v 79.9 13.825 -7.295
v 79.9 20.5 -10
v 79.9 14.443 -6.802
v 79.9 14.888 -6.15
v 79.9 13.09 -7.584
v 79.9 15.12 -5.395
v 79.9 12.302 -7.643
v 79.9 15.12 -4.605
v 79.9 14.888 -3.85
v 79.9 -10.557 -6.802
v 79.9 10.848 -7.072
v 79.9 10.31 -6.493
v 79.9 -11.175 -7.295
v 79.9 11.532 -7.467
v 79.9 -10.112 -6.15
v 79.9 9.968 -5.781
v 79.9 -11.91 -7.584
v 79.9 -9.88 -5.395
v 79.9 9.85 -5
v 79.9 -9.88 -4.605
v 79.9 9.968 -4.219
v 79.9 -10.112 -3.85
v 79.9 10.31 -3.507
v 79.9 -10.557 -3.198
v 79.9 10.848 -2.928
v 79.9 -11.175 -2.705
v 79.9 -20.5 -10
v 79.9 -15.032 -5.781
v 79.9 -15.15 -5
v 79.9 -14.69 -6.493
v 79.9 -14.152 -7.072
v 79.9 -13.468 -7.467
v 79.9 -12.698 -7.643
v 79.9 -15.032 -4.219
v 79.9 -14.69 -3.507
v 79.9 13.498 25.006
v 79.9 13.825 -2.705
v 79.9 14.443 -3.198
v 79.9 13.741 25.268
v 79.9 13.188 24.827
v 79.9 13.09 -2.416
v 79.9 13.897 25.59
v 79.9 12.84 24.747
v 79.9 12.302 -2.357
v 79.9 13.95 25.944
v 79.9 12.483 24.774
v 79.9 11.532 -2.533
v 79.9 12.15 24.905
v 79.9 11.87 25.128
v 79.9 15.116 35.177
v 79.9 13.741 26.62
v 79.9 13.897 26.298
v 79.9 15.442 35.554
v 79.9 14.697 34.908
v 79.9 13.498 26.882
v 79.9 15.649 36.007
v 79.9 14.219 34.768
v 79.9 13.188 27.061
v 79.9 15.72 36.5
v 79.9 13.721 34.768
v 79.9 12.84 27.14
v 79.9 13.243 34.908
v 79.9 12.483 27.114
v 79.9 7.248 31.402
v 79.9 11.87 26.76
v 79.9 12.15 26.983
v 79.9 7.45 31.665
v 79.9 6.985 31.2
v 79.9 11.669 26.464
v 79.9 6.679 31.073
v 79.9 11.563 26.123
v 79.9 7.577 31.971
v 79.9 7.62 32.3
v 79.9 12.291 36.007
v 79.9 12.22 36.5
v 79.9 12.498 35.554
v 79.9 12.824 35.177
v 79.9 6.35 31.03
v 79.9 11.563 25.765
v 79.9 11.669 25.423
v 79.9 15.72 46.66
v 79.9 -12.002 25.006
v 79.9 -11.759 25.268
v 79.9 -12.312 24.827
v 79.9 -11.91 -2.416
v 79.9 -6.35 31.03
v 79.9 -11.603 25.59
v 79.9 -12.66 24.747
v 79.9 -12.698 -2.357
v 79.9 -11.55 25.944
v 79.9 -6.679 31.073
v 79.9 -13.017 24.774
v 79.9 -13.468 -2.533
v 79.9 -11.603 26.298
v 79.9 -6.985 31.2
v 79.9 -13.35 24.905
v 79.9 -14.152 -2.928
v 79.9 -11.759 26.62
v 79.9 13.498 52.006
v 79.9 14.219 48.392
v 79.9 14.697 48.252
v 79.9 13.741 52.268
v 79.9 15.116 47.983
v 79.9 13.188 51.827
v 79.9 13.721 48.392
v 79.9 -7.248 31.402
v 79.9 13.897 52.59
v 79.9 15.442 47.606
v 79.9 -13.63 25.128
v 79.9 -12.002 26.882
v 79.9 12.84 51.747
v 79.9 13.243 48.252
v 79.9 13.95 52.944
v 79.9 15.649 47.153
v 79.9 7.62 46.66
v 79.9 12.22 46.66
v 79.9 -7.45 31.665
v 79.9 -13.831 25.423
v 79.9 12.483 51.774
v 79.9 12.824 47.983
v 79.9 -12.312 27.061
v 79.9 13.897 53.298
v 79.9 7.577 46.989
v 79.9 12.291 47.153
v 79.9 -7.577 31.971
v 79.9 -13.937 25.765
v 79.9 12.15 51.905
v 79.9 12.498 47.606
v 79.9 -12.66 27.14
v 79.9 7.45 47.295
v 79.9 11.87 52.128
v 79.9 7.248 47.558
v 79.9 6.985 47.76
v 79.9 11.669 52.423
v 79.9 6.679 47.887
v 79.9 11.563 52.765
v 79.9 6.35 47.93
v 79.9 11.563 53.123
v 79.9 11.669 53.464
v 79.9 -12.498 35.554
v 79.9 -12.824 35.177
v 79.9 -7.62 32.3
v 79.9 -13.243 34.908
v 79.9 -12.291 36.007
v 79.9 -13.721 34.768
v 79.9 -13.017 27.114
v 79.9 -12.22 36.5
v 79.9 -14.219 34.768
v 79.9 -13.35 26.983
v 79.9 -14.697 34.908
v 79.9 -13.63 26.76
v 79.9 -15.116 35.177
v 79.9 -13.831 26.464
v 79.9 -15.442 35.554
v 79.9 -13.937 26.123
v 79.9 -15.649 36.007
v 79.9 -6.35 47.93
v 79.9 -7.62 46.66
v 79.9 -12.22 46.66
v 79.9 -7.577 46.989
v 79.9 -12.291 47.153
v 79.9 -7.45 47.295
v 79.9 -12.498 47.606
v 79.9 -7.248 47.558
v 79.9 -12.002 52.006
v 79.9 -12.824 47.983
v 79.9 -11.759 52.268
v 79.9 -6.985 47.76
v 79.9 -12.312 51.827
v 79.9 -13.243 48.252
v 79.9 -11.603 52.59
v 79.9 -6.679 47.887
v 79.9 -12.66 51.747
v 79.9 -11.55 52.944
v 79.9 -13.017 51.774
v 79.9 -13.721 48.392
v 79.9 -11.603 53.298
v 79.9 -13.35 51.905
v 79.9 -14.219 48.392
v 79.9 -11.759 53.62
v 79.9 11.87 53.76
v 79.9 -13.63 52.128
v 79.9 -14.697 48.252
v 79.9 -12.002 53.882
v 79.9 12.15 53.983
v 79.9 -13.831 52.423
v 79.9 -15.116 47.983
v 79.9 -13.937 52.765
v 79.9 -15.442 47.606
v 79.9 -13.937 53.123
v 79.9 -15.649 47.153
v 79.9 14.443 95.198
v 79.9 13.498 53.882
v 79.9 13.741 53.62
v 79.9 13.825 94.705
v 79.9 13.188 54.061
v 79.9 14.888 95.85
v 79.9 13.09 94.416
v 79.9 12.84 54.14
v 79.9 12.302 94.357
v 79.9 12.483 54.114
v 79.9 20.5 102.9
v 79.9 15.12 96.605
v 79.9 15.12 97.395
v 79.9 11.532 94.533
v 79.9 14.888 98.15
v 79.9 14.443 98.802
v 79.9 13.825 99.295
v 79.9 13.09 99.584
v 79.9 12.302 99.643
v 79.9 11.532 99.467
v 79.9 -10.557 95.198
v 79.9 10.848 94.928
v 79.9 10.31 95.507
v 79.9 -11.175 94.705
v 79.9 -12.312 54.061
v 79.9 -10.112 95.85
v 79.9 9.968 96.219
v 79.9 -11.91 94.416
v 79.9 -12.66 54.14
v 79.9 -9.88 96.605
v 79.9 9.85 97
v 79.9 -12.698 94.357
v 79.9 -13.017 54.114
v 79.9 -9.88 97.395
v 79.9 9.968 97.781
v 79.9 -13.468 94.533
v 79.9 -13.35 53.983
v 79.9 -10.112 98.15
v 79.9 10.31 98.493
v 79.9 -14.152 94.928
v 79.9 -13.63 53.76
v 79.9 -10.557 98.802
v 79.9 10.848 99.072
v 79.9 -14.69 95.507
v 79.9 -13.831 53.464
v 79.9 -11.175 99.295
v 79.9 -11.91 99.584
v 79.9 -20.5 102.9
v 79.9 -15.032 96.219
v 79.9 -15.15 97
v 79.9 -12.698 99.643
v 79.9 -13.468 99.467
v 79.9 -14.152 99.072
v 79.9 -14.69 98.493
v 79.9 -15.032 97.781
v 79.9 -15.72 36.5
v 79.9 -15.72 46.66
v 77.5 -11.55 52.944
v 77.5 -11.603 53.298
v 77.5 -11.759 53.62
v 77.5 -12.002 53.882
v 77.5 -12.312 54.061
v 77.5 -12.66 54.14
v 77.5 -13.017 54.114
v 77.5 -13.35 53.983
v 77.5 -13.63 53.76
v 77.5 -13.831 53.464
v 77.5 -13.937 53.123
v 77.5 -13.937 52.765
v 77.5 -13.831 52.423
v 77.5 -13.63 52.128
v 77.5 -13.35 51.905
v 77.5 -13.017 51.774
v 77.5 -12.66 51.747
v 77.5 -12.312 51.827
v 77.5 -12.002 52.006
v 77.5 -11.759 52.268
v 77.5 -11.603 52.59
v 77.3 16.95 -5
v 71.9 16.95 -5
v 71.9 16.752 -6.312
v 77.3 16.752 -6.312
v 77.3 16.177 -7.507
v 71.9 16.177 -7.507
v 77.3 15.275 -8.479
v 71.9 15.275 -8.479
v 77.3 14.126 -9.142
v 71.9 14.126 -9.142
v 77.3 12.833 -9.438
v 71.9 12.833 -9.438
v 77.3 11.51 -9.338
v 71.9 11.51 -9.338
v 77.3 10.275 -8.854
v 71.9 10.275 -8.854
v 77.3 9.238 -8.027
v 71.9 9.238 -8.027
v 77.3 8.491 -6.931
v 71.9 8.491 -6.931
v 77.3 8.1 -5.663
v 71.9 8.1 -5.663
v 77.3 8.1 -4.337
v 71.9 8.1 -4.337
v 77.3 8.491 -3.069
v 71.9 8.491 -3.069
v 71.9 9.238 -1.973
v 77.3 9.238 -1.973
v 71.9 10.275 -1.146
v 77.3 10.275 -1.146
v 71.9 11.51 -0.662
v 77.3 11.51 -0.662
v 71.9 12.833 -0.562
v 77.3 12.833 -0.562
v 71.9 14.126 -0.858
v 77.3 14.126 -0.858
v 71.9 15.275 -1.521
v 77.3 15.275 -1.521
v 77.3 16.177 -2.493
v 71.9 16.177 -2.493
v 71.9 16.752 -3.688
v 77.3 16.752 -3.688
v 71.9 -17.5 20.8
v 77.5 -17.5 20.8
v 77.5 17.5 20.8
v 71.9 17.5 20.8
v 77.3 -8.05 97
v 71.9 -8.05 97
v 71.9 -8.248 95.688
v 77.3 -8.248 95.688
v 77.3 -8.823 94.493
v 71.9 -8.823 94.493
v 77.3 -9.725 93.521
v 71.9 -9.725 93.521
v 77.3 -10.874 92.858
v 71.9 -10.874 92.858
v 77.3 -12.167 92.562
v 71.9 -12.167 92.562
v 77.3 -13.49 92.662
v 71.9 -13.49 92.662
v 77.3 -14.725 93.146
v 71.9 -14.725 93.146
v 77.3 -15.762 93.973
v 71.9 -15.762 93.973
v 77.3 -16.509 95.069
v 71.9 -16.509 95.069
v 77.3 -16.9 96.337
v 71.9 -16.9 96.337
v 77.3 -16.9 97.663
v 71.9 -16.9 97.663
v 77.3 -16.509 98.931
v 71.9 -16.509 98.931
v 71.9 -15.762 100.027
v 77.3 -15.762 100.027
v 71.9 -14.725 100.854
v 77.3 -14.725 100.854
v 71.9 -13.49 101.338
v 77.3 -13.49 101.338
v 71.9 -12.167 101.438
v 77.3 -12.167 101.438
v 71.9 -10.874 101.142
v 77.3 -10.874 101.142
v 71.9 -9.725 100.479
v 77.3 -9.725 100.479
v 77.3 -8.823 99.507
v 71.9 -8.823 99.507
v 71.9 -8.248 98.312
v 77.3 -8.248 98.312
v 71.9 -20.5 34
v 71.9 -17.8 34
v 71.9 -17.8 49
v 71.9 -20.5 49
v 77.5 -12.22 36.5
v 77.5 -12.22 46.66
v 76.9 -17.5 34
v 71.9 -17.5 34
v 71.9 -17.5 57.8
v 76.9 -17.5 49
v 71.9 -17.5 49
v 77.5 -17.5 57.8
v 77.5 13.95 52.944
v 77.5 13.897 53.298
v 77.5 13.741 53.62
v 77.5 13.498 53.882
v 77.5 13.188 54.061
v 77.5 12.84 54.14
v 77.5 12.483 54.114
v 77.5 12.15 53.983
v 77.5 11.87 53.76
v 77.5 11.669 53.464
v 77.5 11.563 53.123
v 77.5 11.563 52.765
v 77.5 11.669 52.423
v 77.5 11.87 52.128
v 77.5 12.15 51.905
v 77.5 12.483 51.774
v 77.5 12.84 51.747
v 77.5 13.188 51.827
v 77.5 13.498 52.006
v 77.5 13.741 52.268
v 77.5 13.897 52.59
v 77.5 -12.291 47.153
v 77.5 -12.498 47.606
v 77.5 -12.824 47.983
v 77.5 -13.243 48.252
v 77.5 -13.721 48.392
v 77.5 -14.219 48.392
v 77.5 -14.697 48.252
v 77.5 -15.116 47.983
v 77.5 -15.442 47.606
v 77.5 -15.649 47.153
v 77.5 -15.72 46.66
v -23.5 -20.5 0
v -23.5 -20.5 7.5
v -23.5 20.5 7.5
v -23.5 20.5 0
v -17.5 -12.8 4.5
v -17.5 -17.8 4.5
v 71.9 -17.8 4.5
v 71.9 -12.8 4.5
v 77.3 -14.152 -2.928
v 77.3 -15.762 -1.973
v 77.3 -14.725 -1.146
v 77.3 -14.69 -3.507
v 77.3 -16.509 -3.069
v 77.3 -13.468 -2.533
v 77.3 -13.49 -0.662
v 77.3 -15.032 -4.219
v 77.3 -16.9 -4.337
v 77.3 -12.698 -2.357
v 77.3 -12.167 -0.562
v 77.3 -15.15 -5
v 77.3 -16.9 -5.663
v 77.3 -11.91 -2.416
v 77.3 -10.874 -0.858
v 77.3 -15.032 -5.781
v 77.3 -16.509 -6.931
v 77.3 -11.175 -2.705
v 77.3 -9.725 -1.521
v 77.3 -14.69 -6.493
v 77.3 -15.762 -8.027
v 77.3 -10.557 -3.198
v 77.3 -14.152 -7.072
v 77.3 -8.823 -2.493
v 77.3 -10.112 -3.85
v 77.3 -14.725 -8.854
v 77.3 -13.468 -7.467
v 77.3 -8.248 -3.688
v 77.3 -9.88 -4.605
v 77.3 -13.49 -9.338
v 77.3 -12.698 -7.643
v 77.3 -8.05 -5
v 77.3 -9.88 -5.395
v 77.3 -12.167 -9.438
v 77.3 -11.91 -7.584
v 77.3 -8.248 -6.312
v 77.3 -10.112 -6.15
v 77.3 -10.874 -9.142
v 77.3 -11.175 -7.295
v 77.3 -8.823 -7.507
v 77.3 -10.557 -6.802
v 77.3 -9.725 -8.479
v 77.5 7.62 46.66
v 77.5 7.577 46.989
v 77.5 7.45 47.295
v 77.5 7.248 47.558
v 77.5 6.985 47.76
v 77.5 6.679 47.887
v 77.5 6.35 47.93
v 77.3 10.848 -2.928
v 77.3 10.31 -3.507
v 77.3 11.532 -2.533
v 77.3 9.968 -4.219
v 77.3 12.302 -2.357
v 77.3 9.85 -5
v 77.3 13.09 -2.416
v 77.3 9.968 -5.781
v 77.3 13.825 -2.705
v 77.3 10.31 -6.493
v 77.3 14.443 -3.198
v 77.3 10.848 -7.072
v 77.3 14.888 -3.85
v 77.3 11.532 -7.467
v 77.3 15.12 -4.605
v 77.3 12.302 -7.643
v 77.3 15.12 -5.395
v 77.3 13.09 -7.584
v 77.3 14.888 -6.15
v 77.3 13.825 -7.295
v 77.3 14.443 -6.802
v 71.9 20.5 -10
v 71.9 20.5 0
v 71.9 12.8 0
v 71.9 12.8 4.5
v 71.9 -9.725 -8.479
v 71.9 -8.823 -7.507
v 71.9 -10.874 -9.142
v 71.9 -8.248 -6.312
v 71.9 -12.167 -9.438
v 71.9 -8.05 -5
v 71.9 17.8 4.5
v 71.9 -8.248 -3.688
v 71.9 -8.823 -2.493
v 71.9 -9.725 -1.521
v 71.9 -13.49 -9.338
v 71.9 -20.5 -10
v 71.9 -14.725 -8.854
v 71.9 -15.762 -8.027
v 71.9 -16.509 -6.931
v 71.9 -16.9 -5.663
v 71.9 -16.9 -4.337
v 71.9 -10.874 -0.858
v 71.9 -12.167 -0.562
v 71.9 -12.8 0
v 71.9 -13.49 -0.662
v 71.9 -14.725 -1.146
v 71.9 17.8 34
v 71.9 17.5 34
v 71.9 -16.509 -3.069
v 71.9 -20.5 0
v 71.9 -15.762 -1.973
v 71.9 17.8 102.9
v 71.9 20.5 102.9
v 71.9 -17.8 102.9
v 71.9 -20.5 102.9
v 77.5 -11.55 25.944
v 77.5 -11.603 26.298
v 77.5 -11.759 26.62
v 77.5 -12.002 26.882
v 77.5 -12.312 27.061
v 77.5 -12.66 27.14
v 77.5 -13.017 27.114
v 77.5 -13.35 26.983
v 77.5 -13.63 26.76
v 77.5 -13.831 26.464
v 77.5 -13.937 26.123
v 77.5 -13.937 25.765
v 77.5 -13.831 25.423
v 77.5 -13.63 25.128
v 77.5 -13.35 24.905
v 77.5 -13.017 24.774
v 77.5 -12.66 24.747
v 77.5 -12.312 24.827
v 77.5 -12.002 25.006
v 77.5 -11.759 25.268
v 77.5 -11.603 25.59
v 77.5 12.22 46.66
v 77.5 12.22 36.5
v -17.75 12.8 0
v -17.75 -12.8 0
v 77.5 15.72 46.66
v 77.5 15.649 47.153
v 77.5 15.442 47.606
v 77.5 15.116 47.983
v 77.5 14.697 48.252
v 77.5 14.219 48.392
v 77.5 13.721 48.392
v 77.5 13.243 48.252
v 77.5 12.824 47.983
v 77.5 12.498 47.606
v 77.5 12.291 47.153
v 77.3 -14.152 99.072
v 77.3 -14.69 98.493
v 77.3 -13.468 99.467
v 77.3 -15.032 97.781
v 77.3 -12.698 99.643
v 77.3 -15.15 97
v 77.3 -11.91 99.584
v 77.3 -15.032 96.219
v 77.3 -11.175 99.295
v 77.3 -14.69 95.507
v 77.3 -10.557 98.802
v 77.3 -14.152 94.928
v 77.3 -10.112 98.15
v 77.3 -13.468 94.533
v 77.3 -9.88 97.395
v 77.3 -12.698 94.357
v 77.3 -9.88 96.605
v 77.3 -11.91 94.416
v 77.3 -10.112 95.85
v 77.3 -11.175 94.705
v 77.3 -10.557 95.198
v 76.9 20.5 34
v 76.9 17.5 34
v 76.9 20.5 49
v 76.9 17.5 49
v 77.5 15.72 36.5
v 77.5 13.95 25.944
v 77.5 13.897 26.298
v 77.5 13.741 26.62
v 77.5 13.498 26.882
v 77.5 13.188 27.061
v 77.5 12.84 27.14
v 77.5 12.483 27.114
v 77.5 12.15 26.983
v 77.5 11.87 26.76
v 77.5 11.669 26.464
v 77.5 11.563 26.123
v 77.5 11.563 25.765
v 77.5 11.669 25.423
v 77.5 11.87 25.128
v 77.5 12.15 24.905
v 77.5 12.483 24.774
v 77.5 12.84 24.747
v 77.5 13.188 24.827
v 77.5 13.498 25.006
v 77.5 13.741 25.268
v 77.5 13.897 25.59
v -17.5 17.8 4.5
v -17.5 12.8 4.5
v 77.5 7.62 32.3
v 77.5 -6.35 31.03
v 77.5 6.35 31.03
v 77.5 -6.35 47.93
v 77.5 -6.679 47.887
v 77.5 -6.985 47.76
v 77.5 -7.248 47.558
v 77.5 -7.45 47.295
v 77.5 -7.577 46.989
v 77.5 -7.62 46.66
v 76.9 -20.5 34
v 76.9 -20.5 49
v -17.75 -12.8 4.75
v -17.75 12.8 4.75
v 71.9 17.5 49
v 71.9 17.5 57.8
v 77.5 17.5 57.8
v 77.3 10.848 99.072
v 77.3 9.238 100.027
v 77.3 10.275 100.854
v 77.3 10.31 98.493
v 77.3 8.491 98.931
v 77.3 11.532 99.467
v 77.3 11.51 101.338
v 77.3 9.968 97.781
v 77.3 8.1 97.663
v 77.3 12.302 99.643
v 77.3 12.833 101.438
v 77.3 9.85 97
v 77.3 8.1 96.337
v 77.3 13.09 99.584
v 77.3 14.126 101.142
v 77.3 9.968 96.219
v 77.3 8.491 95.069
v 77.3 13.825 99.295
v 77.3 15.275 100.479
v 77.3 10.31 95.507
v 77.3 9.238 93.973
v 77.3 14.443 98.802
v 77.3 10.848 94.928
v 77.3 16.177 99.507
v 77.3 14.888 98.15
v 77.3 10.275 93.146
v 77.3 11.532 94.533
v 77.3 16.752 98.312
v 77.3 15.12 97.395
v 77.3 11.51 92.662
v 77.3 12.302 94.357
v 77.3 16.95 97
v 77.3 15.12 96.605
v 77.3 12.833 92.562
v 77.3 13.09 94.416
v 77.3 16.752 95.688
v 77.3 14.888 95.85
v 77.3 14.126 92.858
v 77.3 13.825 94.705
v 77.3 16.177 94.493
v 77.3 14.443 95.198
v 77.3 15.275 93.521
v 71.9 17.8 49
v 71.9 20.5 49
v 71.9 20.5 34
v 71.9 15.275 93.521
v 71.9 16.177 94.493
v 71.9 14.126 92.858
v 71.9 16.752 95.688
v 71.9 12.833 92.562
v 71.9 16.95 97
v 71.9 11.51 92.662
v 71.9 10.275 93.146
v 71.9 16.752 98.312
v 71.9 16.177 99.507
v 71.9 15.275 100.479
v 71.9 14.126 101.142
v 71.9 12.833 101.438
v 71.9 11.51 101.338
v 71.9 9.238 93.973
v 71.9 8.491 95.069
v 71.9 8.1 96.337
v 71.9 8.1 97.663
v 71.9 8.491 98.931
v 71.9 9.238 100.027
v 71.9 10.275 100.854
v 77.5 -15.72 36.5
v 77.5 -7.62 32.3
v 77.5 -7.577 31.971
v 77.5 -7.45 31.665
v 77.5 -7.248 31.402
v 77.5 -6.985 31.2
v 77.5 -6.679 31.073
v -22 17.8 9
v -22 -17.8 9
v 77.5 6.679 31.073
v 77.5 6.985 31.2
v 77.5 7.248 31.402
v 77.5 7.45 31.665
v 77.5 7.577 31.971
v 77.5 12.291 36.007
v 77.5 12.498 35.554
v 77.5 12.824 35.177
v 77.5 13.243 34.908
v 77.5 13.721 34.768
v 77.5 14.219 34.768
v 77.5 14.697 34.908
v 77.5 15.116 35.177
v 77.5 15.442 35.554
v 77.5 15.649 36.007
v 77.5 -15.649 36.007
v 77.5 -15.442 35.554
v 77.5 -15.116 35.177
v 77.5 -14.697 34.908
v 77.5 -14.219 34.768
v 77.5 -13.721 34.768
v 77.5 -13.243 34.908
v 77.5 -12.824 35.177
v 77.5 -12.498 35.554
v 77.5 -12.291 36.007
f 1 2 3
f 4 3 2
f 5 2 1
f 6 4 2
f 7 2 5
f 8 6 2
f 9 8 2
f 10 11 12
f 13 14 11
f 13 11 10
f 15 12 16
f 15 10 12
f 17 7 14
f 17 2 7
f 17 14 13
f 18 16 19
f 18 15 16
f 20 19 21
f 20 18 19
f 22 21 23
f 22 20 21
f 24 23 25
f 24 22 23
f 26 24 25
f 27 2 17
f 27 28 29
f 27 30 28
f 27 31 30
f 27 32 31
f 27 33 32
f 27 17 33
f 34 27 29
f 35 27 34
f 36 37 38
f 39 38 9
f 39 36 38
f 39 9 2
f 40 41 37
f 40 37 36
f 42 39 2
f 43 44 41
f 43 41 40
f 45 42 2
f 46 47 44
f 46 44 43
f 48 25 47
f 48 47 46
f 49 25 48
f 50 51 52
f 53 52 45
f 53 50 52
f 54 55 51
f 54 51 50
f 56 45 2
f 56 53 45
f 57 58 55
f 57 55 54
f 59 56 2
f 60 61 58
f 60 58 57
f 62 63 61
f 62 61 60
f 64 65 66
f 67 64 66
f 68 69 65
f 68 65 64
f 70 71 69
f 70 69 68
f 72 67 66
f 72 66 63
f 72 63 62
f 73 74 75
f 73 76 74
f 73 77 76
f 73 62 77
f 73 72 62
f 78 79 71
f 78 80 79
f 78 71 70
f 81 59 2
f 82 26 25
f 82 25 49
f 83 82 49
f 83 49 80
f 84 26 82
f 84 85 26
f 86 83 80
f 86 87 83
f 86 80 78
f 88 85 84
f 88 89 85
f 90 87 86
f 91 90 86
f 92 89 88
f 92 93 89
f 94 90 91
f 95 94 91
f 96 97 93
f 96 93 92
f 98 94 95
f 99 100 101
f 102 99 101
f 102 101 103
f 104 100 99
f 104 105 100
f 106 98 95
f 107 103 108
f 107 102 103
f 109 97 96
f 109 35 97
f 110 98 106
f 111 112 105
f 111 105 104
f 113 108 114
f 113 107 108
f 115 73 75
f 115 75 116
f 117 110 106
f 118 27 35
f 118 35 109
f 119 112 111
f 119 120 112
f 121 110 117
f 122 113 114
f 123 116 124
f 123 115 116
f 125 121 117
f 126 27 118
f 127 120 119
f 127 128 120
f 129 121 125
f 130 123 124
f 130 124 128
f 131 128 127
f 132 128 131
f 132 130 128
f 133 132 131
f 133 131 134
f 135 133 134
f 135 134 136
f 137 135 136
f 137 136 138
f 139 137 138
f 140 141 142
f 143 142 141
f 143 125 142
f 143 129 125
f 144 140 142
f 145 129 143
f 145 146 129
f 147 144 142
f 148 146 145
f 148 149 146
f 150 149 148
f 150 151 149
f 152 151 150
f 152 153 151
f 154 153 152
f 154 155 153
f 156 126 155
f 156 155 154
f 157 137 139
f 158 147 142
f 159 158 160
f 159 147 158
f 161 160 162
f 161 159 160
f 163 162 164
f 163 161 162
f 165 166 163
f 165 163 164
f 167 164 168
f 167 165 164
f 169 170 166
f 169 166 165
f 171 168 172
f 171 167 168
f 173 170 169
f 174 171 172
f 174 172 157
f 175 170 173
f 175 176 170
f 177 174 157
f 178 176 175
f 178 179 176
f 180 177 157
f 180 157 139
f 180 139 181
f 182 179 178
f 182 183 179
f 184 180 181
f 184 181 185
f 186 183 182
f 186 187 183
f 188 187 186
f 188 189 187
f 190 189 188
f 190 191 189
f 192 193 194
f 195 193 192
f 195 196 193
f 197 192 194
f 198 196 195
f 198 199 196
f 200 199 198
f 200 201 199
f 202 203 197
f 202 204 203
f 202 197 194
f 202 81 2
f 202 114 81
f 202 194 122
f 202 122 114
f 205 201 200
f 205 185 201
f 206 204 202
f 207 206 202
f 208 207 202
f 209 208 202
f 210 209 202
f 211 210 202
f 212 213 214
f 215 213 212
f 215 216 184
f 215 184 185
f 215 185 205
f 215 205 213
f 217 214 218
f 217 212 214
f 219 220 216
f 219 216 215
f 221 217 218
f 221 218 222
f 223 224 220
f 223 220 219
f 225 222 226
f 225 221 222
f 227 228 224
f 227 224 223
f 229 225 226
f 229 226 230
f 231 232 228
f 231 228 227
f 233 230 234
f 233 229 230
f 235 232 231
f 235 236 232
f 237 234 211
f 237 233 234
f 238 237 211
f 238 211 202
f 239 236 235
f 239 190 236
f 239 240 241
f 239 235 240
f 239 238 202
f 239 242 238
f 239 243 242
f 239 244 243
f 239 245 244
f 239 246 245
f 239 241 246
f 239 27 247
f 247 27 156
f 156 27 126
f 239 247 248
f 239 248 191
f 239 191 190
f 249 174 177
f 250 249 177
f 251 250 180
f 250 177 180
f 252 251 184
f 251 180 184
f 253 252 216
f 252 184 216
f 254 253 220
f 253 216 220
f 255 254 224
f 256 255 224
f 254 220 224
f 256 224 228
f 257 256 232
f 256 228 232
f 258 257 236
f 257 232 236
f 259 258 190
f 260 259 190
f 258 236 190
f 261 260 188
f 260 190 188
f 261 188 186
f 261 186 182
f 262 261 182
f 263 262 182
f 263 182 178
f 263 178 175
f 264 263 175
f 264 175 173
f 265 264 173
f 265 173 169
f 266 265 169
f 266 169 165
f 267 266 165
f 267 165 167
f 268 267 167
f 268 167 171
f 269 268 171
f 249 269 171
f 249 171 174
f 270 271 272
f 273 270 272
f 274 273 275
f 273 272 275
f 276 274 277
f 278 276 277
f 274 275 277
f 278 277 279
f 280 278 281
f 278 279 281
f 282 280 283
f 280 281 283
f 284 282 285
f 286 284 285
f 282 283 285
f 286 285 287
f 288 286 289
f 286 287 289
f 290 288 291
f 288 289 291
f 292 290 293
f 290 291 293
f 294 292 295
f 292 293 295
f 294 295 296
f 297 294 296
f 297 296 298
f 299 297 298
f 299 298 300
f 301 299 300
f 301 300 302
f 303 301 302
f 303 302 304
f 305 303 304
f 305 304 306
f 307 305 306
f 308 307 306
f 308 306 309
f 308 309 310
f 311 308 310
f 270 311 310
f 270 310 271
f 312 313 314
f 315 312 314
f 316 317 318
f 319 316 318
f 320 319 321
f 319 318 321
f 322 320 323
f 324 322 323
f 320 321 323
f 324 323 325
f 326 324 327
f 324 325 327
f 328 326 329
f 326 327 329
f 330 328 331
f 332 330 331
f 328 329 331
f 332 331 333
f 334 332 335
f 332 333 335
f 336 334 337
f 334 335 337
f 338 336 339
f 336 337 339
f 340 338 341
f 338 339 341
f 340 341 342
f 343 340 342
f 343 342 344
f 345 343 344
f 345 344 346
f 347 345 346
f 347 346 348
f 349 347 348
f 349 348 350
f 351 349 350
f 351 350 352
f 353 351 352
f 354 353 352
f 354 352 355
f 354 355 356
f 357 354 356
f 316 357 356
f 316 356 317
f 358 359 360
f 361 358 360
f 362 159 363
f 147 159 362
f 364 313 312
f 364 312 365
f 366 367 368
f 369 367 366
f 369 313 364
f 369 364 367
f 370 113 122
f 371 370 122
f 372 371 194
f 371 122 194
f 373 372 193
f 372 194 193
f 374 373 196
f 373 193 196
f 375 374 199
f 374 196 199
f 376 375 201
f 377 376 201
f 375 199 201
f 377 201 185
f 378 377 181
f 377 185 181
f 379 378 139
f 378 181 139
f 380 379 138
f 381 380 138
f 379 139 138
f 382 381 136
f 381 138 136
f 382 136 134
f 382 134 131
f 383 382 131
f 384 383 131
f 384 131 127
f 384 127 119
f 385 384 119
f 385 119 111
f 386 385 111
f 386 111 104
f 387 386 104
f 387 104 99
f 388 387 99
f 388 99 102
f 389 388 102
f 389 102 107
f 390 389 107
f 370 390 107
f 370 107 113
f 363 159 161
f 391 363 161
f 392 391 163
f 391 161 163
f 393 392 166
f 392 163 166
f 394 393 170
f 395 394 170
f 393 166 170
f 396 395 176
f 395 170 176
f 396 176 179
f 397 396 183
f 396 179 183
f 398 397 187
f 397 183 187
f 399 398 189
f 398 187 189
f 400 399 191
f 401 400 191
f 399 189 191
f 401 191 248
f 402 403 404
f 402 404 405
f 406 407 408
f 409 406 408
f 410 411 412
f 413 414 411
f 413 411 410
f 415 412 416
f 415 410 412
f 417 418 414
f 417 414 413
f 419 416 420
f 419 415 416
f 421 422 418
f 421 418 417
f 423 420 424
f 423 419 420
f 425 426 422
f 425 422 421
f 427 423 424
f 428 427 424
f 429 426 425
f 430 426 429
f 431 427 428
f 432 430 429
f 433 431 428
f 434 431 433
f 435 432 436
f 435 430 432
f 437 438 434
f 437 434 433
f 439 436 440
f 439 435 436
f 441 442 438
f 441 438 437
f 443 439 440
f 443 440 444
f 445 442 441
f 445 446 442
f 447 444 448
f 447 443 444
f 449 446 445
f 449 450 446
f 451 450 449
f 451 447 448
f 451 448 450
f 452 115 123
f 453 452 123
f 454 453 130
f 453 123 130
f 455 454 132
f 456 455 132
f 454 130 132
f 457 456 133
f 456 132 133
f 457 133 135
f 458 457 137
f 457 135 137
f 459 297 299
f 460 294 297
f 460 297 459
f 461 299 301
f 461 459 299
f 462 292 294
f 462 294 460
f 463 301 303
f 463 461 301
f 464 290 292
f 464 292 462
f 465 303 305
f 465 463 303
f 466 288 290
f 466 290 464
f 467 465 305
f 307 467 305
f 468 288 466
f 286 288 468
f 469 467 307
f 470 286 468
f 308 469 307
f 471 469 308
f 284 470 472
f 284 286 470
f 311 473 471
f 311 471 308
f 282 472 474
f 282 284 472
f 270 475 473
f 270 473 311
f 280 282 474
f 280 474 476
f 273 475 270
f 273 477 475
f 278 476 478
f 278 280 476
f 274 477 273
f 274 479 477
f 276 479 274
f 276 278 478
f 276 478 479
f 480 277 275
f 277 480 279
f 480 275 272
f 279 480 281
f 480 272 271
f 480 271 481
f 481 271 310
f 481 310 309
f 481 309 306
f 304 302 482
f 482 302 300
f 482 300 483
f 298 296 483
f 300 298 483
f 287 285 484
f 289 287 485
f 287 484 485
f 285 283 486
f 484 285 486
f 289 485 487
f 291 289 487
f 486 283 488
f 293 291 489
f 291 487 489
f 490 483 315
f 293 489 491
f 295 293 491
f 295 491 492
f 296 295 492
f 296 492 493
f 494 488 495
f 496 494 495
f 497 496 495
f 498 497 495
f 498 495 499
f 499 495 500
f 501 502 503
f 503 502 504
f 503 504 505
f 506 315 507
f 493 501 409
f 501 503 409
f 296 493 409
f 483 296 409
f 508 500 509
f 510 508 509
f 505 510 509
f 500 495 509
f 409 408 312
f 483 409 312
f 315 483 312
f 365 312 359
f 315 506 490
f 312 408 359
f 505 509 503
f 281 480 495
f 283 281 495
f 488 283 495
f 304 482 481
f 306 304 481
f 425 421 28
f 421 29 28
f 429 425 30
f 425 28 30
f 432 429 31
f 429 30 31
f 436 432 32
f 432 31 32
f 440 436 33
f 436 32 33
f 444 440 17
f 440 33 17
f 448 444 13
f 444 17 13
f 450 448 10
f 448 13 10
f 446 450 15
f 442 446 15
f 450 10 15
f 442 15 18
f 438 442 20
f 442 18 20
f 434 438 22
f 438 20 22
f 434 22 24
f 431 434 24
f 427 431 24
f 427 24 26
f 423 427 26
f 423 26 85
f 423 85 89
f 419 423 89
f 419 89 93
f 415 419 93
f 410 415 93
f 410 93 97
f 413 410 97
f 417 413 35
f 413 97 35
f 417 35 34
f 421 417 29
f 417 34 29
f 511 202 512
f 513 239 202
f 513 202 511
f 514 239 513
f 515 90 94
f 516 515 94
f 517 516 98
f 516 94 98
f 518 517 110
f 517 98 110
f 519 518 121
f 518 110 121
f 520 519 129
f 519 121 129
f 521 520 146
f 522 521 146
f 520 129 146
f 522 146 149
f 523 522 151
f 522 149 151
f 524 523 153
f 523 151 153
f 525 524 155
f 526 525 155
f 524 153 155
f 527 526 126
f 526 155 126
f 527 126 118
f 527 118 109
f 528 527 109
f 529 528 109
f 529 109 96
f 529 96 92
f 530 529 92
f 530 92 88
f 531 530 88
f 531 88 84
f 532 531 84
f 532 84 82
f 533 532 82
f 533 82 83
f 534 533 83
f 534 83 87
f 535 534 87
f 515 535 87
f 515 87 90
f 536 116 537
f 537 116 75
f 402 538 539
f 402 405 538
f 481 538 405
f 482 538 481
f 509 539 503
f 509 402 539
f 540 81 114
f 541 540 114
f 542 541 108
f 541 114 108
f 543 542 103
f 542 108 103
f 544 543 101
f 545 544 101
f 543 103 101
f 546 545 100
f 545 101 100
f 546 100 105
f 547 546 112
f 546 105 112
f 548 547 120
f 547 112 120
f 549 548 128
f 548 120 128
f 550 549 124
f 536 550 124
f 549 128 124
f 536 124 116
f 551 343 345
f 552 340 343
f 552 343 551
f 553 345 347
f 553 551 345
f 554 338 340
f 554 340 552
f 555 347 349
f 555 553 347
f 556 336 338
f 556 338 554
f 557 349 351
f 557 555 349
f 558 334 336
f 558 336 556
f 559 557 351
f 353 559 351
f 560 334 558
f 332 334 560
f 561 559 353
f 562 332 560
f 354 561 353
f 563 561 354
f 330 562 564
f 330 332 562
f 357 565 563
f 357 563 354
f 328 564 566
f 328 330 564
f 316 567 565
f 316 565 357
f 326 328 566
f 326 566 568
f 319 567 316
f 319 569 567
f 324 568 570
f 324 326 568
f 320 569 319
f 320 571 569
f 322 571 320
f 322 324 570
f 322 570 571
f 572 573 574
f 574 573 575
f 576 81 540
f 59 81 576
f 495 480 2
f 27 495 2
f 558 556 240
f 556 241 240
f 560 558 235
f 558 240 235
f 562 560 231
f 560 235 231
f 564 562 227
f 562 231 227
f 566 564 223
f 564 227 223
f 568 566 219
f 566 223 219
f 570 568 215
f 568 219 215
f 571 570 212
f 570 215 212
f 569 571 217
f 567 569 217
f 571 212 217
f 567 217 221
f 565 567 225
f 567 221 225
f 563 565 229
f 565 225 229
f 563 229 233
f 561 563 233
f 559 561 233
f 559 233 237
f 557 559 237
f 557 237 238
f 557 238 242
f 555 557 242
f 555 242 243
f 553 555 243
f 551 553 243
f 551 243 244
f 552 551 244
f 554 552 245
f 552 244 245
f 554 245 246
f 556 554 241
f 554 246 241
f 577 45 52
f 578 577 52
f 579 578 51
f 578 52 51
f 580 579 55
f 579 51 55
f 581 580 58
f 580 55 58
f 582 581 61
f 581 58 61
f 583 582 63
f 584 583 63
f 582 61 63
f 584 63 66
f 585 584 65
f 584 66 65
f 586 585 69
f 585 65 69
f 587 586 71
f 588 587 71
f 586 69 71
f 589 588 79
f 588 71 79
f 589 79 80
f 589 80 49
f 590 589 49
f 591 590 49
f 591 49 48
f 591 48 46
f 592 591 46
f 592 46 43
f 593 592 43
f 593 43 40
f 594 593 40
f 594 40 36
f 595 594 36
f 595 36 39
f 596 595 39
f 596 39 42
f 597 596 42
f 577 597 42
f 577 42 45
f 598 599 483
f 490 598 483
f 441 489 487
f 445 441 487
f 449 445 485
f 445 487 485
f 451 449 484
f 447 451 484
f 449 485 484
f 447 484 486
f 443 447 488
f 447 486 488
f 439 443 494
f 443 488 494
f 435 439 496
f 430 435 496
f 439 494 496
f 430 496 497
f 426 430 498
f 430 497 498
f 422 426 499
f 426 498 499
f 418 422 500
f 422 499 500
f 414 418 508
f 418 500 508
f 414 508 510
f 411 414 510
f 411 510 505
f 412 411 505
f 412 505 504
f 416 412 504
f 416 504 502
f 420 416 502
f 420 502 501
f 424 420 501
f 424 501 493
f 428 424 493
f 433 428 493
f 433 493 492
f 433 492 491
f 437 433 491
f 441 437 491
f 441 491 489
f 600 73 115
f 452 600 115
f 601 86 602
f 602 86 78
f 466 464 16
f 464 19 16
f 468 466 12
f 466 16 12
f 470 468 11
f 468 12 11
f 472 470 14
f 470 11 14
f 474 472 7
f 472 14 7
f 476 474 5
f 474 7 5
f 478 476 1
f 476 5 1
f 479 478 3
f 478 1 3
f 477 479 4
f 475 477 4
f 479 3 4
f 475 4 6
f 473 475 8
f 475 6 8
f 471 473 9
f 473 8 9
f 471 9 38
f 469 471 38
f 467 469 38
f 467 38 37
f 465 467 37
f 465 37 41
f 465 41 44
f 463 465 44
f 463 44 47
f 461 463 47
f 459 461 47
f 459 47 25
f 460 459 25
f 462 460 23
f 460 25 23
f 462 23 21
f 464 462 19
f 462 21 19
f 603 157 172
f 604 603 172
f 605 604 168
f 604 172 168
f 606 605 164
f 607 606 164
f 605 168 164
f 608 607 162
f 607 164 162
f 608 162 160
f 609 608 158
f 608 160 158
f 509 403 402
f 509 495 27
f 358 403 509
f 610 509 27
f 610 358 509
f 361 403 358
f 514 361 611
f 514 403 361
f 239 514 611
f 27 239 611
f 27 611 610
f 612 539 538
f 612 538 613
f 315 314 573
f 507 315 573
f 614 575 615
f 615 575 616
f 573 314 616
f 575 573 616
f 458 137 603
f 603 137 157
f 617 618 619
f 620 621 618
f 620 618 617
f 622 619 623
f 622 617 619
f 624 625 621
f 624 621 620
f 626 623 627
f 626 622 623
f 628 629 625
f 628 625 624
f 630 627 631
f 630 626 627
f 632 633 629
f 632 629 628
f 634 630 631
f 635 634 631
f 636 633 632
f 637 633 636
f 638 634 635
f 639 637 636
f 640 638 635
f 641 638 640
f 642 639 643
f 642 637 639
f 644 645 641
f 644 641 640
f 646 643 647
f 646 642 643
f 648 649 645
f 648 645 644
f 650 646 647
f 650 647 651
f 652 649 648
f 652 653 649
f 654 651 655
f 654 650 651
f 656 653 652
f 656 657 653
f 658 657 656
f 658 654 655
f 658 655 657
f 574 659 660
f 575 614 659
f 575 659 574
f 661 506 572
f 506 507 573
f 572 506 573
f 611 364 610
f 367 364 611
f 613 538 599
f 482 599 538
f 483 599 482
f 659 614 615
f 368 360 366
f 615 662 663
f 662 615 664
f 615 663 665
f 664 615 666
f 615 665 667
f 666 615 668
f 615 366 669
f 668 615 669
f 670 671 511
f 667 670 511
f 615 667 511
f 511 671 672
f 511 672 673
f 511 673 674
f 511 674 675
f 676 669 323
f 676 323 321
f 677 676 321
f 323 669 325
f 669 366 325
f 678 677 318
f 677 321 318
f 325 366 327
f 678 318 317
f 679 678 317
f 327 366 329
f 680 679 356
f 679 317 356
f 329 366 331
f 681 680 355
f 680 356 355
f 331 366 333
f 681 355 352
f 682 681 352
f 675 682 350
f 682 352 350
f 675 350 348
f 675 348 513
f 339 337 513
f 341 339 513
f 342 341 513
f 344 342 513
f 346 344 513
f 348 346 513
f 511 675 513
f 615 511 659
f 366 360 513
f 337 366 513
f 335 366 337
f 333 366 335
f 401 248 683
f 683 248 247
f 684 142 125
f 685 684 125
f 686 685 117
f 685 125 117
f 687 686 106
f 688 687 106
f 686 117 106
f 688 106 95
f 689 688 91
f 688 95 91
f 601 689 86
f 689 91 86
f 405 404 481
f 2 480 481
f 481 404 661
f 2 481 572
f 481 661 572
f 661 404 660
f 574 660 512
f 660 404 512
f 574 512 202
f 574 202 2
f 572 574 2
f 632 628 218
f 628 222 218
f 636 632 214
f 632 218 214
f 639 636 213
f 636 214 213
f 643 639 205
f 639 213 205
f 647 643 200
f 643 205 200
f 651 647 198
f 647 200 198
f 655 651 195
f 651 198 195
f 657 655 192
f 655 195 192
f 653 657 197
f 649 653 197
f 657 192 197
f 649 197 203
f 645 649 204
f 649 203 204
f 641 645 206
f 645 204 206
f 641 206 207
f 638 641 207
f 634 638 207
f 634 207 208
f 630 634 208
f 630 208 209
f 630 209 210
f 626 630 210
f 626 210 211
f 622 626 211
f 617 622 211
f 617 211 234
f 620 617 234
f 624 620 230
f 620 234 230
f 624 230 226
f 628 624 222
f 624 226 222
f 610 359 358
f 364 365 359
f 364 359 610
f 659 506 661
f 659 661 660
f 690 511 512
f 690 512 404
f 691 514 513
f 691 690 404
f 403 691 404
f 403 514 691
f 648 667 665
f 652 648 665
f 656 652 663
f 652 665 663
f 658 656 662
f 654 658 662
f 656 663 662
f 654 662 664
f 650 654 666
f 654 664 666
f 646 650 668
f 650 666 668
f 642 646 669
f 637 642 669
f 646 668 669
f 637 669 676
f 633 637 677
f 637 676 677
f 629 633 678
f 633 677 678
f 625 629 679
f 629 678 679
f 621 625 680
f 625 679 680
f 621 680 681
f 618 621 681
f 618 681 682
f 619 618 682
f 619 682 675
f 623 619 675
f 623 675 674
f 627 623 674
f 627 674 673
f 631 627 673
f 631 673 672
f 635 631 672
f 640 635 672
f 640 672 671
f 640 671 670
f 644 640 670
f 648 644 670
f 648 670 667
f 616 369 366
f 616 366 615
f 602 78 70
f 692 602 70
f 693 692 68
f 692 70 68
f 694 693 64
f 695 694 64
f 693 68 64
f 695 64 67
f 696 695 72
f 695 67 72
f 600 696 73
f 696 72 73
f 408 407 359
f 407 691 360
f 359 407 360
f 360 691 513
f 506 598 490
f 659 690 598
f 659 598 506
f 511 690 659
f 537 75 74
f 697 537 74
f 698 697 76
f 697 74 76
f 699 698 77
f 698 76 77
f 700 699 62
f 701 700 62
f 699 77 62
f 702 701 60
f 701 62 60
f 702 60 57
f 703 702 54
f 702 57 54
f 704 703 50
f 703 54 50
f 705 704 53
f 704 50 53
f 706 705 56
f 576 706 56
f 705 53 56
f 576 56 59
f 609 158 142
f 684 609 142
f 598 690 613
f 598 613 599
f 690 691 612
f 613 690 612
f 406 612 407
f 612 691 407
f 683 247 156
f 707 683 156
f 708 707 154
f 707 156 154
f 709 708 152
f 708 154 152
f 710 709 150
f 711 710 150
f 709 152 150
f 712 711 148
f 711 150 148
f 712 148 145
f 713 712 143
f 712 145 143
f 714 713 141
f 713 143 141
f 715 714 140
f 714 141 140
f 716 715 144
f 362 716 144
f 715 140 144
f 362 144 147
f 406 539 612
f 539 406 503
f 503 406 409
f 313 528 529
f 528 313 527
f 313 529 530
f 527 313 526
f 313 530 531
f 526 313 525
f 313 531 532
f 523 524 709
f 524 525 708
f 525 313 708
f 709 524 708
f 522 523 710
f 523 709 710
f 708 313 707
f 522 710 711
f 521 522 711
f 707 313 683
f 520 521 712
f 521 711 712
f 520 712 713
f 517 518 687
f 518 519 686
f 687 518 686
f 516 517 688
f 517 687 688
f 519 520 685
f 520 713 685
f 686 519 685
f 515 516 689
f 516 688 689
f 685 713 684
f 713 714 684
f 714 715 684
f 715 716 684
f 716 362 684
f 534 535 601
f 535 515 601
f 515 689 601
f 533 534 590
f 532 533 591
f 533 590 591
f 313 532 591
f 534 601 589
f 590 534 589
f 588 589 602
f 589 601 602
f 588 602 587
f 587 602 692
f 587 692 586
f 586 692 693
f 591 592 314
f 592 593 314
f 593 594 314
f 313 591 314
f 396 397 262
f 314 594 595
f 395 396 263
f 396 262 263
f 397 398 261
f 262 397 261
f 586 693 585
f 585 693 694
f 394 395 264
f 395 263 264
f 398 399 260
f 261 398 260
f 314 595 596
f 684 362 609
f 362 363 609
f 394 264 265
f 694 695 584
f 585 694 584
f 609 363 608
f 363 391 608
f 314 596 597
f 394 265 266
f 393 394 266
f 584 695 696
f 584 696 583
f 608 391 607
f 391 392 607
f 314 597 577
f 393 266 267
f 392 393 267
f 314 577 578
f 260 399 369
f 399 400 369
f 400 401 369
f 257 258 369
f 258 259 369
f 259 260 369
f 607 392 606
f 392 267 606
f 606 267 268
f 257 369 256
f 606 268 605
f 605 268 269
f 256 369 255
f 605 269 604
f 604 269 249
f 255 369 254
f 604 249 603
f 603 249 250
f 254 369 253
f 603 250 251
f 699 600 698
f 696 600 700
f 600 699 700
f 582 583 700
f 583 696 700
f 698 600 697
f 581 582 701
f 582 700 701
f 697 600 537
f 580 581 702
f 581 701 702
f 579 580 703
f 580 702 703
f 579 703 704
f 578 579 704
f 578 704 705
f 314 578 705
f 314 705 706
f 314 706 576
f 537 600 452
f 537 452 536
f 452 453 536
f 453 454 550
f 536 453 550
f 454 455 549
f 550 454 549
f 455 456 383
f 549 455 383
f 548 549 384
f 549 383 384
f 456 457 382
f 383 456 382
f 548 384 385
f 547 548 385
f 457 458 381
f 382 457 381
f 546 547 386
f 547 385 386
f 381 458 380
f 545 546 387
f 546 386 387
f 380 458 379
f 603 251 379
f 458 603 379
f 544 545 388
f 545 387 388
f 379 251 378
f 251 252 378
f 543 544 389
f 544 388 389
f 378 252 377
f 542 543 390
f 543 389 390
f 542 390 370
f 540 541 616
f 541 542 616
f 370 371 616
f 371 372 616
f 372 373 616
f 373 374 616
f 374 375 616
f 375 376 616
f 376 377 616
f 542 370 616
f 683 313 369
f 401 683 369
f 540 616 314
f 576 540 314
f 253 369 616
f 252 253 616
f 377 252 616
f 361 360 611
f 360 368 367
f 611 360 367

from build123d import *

# Parameters (mm, degrees)
PAD001_DEPTH         = 20.5
POCKET_DEPTH         = 17.8
SKETCH020_W          = 89.65
SKETCH020_H          = 5
POCKET002_DEPTH      = 12.8
HOLE006_D            = 5.3
HOLE006_CBORE_D      = 8.9
HOLE006_CBORE_DEPTH  = 5.4
SKETCH032_W          = 35
SKETCH032_H          = 37
POCKET010_DEPTH      = 101.001
SKETCH033_W          = 5
SKETCH033_H          = 15
POCKET011_DEPTH      = 20.501
POCKET011_DEPTH_BACK = 20.501
SKETCH034_R          = 1.2
POCKET012_DEPTH      = 103.501


with BuildPart() as part:
    # Sketch018 → Pad001 (new body, symmetric)
    with BuildSketch(Plane.XZ):
        Polygon((71.9, 102.9), (-23.5, 7.5), (-23.5, 0), (71.9, 0), (71.9, -10), (79.9, -10), (79.9, 102.9), align=None)
    extrude(amount=PAD001_DEPTH, both=True)

    # Sketch019 → Pocket (cut, symmetric)
    with BuildSketch(Plane.XZ):
        Polygon((-17.5, 4.5), (71.9, 4.5), (71.9, 104.5), (-27.5, 104.5), (-27.5, 14.5), align=None)
    extrude(amount=POCKET_DEPTH, both=True, mode=Mode.SUBTRACT)

    # Sketch020 → Pocket002 (cut, symmetric)
    with BuildSketch(Plane.XZ):
        with Locations((27.075, 2.5)):
            Rectangle(SKETCH020_W, SKETCH020_H)
    extrude(amount=POCKET002_DEPTH, both=True, mode=Mode.SUBTRACT)

    # Hole006 (through all)
    with Locations(Plane(origin=(71.9, 0, 0), x_dir=(0, 1, 0), z_dir=(-1, 0, 0))):
        with Locations((-12.5, -97), (12.5, -97), (-12.5, 5), (12.5, 5)):
            CounterBoreHole(HOLE006_D / 2, HOLE006_CBORE_D / 2, HOLE006_CBORE_DEPTH)

    # Sketch032 → Pocket010 (cut, through all)
    with BuildSketch(Plane.YZ.offset(77.5)):
        with Locations((0, 39.3)):
            Rectangle(SKETCH032_W, SKETCH032_H)
    extrude(amount=-POCKET010_DEPTH, mode=Mode.SUBTRACT)

    # Sketch033 → Pocket011 (cut, two sides)
    with BuildSketch(Plane.XZ) as pocket011_sk:
        with Locations((74.4, 41.5)):
            Rectangle(SKETCH033_W, SKETCH033_H)
    extrude(amount=-POCKET011_DEPTH, mode=Mode.SUBTRACT)
    extrude(pocket011_sk.sketch, amount=POCKET011_DEPTH_BACK, mode=Mode.SUBTRACT)

    # Sketch034 → Pocket012 (cut, through all)
    with BuildSketch(Plane.YZ.offset(80)):
        with Locations((-12.75, 52.94381)):
            Circle(SKETCH034_R)
        with Locations((12.75, 52.94381)):
            Circle(SKETCH034_R)
        with Locations((12.75, 25.94381)):
            Circle(SKETCH034_R)
        with Locations((-12.75, 25.94381)):
            Circle(SKETCH034_R)
        with BuildLine():
            ThreePointArc((-12.22, 46.66), (-13.97, 48.41), (-15.72, 46.66))
            Line((-15.72, 46.66), (-15.72, 36.5))
            ThreePointArc((-15.72, 36.5), (-13.97, 34.75), (-12.22, 36.5))
            Line((-12.22, 46.66), (-12.22, 36.5))
        make_face()
        with BuildLine():
            ThreePointArc((15.72, 46.66), (13.97, 48.41), (12.22, 46.66))
            Line((12.22, 46.66), (12.22, 36.5))
            ThreePointArc((12.22, 36.5), (13.97, 34.75), (15.72, 36.5))
            Line((15.72, 46.66), (15.72, 36.5))
        make_face()
        with BuildLine():
            Line((-7.62, 46.66), (-7.62, 32.3))
            ThreePointArc((-7.62, 32.3), (-7.248026, 31.401974), (-6.35, 31.03))
            Line((-6.35, 31.03), (6.35, 31.03))
            ThreePointArc((6.35, 31.03), (7.248026, 31.401974), (7.62, 32.3))
            Line((7.62, 32.3), (7.62, 46.66))
            ThreePointArc((7.62, 46.66), (7.248026, 47.558026), (6.35, 47.93))
            Line((6.35, 47.93), (-6.35, 47.93))
            ThreePointArc((-6.35, 47.93), (-7.248026, 47.558026), (-7.62, 46.66))
        make_face()
    extrude(amount=-POCKET012_DEPTH, mode=Mode.SUBTRACT)


solid = part.part
